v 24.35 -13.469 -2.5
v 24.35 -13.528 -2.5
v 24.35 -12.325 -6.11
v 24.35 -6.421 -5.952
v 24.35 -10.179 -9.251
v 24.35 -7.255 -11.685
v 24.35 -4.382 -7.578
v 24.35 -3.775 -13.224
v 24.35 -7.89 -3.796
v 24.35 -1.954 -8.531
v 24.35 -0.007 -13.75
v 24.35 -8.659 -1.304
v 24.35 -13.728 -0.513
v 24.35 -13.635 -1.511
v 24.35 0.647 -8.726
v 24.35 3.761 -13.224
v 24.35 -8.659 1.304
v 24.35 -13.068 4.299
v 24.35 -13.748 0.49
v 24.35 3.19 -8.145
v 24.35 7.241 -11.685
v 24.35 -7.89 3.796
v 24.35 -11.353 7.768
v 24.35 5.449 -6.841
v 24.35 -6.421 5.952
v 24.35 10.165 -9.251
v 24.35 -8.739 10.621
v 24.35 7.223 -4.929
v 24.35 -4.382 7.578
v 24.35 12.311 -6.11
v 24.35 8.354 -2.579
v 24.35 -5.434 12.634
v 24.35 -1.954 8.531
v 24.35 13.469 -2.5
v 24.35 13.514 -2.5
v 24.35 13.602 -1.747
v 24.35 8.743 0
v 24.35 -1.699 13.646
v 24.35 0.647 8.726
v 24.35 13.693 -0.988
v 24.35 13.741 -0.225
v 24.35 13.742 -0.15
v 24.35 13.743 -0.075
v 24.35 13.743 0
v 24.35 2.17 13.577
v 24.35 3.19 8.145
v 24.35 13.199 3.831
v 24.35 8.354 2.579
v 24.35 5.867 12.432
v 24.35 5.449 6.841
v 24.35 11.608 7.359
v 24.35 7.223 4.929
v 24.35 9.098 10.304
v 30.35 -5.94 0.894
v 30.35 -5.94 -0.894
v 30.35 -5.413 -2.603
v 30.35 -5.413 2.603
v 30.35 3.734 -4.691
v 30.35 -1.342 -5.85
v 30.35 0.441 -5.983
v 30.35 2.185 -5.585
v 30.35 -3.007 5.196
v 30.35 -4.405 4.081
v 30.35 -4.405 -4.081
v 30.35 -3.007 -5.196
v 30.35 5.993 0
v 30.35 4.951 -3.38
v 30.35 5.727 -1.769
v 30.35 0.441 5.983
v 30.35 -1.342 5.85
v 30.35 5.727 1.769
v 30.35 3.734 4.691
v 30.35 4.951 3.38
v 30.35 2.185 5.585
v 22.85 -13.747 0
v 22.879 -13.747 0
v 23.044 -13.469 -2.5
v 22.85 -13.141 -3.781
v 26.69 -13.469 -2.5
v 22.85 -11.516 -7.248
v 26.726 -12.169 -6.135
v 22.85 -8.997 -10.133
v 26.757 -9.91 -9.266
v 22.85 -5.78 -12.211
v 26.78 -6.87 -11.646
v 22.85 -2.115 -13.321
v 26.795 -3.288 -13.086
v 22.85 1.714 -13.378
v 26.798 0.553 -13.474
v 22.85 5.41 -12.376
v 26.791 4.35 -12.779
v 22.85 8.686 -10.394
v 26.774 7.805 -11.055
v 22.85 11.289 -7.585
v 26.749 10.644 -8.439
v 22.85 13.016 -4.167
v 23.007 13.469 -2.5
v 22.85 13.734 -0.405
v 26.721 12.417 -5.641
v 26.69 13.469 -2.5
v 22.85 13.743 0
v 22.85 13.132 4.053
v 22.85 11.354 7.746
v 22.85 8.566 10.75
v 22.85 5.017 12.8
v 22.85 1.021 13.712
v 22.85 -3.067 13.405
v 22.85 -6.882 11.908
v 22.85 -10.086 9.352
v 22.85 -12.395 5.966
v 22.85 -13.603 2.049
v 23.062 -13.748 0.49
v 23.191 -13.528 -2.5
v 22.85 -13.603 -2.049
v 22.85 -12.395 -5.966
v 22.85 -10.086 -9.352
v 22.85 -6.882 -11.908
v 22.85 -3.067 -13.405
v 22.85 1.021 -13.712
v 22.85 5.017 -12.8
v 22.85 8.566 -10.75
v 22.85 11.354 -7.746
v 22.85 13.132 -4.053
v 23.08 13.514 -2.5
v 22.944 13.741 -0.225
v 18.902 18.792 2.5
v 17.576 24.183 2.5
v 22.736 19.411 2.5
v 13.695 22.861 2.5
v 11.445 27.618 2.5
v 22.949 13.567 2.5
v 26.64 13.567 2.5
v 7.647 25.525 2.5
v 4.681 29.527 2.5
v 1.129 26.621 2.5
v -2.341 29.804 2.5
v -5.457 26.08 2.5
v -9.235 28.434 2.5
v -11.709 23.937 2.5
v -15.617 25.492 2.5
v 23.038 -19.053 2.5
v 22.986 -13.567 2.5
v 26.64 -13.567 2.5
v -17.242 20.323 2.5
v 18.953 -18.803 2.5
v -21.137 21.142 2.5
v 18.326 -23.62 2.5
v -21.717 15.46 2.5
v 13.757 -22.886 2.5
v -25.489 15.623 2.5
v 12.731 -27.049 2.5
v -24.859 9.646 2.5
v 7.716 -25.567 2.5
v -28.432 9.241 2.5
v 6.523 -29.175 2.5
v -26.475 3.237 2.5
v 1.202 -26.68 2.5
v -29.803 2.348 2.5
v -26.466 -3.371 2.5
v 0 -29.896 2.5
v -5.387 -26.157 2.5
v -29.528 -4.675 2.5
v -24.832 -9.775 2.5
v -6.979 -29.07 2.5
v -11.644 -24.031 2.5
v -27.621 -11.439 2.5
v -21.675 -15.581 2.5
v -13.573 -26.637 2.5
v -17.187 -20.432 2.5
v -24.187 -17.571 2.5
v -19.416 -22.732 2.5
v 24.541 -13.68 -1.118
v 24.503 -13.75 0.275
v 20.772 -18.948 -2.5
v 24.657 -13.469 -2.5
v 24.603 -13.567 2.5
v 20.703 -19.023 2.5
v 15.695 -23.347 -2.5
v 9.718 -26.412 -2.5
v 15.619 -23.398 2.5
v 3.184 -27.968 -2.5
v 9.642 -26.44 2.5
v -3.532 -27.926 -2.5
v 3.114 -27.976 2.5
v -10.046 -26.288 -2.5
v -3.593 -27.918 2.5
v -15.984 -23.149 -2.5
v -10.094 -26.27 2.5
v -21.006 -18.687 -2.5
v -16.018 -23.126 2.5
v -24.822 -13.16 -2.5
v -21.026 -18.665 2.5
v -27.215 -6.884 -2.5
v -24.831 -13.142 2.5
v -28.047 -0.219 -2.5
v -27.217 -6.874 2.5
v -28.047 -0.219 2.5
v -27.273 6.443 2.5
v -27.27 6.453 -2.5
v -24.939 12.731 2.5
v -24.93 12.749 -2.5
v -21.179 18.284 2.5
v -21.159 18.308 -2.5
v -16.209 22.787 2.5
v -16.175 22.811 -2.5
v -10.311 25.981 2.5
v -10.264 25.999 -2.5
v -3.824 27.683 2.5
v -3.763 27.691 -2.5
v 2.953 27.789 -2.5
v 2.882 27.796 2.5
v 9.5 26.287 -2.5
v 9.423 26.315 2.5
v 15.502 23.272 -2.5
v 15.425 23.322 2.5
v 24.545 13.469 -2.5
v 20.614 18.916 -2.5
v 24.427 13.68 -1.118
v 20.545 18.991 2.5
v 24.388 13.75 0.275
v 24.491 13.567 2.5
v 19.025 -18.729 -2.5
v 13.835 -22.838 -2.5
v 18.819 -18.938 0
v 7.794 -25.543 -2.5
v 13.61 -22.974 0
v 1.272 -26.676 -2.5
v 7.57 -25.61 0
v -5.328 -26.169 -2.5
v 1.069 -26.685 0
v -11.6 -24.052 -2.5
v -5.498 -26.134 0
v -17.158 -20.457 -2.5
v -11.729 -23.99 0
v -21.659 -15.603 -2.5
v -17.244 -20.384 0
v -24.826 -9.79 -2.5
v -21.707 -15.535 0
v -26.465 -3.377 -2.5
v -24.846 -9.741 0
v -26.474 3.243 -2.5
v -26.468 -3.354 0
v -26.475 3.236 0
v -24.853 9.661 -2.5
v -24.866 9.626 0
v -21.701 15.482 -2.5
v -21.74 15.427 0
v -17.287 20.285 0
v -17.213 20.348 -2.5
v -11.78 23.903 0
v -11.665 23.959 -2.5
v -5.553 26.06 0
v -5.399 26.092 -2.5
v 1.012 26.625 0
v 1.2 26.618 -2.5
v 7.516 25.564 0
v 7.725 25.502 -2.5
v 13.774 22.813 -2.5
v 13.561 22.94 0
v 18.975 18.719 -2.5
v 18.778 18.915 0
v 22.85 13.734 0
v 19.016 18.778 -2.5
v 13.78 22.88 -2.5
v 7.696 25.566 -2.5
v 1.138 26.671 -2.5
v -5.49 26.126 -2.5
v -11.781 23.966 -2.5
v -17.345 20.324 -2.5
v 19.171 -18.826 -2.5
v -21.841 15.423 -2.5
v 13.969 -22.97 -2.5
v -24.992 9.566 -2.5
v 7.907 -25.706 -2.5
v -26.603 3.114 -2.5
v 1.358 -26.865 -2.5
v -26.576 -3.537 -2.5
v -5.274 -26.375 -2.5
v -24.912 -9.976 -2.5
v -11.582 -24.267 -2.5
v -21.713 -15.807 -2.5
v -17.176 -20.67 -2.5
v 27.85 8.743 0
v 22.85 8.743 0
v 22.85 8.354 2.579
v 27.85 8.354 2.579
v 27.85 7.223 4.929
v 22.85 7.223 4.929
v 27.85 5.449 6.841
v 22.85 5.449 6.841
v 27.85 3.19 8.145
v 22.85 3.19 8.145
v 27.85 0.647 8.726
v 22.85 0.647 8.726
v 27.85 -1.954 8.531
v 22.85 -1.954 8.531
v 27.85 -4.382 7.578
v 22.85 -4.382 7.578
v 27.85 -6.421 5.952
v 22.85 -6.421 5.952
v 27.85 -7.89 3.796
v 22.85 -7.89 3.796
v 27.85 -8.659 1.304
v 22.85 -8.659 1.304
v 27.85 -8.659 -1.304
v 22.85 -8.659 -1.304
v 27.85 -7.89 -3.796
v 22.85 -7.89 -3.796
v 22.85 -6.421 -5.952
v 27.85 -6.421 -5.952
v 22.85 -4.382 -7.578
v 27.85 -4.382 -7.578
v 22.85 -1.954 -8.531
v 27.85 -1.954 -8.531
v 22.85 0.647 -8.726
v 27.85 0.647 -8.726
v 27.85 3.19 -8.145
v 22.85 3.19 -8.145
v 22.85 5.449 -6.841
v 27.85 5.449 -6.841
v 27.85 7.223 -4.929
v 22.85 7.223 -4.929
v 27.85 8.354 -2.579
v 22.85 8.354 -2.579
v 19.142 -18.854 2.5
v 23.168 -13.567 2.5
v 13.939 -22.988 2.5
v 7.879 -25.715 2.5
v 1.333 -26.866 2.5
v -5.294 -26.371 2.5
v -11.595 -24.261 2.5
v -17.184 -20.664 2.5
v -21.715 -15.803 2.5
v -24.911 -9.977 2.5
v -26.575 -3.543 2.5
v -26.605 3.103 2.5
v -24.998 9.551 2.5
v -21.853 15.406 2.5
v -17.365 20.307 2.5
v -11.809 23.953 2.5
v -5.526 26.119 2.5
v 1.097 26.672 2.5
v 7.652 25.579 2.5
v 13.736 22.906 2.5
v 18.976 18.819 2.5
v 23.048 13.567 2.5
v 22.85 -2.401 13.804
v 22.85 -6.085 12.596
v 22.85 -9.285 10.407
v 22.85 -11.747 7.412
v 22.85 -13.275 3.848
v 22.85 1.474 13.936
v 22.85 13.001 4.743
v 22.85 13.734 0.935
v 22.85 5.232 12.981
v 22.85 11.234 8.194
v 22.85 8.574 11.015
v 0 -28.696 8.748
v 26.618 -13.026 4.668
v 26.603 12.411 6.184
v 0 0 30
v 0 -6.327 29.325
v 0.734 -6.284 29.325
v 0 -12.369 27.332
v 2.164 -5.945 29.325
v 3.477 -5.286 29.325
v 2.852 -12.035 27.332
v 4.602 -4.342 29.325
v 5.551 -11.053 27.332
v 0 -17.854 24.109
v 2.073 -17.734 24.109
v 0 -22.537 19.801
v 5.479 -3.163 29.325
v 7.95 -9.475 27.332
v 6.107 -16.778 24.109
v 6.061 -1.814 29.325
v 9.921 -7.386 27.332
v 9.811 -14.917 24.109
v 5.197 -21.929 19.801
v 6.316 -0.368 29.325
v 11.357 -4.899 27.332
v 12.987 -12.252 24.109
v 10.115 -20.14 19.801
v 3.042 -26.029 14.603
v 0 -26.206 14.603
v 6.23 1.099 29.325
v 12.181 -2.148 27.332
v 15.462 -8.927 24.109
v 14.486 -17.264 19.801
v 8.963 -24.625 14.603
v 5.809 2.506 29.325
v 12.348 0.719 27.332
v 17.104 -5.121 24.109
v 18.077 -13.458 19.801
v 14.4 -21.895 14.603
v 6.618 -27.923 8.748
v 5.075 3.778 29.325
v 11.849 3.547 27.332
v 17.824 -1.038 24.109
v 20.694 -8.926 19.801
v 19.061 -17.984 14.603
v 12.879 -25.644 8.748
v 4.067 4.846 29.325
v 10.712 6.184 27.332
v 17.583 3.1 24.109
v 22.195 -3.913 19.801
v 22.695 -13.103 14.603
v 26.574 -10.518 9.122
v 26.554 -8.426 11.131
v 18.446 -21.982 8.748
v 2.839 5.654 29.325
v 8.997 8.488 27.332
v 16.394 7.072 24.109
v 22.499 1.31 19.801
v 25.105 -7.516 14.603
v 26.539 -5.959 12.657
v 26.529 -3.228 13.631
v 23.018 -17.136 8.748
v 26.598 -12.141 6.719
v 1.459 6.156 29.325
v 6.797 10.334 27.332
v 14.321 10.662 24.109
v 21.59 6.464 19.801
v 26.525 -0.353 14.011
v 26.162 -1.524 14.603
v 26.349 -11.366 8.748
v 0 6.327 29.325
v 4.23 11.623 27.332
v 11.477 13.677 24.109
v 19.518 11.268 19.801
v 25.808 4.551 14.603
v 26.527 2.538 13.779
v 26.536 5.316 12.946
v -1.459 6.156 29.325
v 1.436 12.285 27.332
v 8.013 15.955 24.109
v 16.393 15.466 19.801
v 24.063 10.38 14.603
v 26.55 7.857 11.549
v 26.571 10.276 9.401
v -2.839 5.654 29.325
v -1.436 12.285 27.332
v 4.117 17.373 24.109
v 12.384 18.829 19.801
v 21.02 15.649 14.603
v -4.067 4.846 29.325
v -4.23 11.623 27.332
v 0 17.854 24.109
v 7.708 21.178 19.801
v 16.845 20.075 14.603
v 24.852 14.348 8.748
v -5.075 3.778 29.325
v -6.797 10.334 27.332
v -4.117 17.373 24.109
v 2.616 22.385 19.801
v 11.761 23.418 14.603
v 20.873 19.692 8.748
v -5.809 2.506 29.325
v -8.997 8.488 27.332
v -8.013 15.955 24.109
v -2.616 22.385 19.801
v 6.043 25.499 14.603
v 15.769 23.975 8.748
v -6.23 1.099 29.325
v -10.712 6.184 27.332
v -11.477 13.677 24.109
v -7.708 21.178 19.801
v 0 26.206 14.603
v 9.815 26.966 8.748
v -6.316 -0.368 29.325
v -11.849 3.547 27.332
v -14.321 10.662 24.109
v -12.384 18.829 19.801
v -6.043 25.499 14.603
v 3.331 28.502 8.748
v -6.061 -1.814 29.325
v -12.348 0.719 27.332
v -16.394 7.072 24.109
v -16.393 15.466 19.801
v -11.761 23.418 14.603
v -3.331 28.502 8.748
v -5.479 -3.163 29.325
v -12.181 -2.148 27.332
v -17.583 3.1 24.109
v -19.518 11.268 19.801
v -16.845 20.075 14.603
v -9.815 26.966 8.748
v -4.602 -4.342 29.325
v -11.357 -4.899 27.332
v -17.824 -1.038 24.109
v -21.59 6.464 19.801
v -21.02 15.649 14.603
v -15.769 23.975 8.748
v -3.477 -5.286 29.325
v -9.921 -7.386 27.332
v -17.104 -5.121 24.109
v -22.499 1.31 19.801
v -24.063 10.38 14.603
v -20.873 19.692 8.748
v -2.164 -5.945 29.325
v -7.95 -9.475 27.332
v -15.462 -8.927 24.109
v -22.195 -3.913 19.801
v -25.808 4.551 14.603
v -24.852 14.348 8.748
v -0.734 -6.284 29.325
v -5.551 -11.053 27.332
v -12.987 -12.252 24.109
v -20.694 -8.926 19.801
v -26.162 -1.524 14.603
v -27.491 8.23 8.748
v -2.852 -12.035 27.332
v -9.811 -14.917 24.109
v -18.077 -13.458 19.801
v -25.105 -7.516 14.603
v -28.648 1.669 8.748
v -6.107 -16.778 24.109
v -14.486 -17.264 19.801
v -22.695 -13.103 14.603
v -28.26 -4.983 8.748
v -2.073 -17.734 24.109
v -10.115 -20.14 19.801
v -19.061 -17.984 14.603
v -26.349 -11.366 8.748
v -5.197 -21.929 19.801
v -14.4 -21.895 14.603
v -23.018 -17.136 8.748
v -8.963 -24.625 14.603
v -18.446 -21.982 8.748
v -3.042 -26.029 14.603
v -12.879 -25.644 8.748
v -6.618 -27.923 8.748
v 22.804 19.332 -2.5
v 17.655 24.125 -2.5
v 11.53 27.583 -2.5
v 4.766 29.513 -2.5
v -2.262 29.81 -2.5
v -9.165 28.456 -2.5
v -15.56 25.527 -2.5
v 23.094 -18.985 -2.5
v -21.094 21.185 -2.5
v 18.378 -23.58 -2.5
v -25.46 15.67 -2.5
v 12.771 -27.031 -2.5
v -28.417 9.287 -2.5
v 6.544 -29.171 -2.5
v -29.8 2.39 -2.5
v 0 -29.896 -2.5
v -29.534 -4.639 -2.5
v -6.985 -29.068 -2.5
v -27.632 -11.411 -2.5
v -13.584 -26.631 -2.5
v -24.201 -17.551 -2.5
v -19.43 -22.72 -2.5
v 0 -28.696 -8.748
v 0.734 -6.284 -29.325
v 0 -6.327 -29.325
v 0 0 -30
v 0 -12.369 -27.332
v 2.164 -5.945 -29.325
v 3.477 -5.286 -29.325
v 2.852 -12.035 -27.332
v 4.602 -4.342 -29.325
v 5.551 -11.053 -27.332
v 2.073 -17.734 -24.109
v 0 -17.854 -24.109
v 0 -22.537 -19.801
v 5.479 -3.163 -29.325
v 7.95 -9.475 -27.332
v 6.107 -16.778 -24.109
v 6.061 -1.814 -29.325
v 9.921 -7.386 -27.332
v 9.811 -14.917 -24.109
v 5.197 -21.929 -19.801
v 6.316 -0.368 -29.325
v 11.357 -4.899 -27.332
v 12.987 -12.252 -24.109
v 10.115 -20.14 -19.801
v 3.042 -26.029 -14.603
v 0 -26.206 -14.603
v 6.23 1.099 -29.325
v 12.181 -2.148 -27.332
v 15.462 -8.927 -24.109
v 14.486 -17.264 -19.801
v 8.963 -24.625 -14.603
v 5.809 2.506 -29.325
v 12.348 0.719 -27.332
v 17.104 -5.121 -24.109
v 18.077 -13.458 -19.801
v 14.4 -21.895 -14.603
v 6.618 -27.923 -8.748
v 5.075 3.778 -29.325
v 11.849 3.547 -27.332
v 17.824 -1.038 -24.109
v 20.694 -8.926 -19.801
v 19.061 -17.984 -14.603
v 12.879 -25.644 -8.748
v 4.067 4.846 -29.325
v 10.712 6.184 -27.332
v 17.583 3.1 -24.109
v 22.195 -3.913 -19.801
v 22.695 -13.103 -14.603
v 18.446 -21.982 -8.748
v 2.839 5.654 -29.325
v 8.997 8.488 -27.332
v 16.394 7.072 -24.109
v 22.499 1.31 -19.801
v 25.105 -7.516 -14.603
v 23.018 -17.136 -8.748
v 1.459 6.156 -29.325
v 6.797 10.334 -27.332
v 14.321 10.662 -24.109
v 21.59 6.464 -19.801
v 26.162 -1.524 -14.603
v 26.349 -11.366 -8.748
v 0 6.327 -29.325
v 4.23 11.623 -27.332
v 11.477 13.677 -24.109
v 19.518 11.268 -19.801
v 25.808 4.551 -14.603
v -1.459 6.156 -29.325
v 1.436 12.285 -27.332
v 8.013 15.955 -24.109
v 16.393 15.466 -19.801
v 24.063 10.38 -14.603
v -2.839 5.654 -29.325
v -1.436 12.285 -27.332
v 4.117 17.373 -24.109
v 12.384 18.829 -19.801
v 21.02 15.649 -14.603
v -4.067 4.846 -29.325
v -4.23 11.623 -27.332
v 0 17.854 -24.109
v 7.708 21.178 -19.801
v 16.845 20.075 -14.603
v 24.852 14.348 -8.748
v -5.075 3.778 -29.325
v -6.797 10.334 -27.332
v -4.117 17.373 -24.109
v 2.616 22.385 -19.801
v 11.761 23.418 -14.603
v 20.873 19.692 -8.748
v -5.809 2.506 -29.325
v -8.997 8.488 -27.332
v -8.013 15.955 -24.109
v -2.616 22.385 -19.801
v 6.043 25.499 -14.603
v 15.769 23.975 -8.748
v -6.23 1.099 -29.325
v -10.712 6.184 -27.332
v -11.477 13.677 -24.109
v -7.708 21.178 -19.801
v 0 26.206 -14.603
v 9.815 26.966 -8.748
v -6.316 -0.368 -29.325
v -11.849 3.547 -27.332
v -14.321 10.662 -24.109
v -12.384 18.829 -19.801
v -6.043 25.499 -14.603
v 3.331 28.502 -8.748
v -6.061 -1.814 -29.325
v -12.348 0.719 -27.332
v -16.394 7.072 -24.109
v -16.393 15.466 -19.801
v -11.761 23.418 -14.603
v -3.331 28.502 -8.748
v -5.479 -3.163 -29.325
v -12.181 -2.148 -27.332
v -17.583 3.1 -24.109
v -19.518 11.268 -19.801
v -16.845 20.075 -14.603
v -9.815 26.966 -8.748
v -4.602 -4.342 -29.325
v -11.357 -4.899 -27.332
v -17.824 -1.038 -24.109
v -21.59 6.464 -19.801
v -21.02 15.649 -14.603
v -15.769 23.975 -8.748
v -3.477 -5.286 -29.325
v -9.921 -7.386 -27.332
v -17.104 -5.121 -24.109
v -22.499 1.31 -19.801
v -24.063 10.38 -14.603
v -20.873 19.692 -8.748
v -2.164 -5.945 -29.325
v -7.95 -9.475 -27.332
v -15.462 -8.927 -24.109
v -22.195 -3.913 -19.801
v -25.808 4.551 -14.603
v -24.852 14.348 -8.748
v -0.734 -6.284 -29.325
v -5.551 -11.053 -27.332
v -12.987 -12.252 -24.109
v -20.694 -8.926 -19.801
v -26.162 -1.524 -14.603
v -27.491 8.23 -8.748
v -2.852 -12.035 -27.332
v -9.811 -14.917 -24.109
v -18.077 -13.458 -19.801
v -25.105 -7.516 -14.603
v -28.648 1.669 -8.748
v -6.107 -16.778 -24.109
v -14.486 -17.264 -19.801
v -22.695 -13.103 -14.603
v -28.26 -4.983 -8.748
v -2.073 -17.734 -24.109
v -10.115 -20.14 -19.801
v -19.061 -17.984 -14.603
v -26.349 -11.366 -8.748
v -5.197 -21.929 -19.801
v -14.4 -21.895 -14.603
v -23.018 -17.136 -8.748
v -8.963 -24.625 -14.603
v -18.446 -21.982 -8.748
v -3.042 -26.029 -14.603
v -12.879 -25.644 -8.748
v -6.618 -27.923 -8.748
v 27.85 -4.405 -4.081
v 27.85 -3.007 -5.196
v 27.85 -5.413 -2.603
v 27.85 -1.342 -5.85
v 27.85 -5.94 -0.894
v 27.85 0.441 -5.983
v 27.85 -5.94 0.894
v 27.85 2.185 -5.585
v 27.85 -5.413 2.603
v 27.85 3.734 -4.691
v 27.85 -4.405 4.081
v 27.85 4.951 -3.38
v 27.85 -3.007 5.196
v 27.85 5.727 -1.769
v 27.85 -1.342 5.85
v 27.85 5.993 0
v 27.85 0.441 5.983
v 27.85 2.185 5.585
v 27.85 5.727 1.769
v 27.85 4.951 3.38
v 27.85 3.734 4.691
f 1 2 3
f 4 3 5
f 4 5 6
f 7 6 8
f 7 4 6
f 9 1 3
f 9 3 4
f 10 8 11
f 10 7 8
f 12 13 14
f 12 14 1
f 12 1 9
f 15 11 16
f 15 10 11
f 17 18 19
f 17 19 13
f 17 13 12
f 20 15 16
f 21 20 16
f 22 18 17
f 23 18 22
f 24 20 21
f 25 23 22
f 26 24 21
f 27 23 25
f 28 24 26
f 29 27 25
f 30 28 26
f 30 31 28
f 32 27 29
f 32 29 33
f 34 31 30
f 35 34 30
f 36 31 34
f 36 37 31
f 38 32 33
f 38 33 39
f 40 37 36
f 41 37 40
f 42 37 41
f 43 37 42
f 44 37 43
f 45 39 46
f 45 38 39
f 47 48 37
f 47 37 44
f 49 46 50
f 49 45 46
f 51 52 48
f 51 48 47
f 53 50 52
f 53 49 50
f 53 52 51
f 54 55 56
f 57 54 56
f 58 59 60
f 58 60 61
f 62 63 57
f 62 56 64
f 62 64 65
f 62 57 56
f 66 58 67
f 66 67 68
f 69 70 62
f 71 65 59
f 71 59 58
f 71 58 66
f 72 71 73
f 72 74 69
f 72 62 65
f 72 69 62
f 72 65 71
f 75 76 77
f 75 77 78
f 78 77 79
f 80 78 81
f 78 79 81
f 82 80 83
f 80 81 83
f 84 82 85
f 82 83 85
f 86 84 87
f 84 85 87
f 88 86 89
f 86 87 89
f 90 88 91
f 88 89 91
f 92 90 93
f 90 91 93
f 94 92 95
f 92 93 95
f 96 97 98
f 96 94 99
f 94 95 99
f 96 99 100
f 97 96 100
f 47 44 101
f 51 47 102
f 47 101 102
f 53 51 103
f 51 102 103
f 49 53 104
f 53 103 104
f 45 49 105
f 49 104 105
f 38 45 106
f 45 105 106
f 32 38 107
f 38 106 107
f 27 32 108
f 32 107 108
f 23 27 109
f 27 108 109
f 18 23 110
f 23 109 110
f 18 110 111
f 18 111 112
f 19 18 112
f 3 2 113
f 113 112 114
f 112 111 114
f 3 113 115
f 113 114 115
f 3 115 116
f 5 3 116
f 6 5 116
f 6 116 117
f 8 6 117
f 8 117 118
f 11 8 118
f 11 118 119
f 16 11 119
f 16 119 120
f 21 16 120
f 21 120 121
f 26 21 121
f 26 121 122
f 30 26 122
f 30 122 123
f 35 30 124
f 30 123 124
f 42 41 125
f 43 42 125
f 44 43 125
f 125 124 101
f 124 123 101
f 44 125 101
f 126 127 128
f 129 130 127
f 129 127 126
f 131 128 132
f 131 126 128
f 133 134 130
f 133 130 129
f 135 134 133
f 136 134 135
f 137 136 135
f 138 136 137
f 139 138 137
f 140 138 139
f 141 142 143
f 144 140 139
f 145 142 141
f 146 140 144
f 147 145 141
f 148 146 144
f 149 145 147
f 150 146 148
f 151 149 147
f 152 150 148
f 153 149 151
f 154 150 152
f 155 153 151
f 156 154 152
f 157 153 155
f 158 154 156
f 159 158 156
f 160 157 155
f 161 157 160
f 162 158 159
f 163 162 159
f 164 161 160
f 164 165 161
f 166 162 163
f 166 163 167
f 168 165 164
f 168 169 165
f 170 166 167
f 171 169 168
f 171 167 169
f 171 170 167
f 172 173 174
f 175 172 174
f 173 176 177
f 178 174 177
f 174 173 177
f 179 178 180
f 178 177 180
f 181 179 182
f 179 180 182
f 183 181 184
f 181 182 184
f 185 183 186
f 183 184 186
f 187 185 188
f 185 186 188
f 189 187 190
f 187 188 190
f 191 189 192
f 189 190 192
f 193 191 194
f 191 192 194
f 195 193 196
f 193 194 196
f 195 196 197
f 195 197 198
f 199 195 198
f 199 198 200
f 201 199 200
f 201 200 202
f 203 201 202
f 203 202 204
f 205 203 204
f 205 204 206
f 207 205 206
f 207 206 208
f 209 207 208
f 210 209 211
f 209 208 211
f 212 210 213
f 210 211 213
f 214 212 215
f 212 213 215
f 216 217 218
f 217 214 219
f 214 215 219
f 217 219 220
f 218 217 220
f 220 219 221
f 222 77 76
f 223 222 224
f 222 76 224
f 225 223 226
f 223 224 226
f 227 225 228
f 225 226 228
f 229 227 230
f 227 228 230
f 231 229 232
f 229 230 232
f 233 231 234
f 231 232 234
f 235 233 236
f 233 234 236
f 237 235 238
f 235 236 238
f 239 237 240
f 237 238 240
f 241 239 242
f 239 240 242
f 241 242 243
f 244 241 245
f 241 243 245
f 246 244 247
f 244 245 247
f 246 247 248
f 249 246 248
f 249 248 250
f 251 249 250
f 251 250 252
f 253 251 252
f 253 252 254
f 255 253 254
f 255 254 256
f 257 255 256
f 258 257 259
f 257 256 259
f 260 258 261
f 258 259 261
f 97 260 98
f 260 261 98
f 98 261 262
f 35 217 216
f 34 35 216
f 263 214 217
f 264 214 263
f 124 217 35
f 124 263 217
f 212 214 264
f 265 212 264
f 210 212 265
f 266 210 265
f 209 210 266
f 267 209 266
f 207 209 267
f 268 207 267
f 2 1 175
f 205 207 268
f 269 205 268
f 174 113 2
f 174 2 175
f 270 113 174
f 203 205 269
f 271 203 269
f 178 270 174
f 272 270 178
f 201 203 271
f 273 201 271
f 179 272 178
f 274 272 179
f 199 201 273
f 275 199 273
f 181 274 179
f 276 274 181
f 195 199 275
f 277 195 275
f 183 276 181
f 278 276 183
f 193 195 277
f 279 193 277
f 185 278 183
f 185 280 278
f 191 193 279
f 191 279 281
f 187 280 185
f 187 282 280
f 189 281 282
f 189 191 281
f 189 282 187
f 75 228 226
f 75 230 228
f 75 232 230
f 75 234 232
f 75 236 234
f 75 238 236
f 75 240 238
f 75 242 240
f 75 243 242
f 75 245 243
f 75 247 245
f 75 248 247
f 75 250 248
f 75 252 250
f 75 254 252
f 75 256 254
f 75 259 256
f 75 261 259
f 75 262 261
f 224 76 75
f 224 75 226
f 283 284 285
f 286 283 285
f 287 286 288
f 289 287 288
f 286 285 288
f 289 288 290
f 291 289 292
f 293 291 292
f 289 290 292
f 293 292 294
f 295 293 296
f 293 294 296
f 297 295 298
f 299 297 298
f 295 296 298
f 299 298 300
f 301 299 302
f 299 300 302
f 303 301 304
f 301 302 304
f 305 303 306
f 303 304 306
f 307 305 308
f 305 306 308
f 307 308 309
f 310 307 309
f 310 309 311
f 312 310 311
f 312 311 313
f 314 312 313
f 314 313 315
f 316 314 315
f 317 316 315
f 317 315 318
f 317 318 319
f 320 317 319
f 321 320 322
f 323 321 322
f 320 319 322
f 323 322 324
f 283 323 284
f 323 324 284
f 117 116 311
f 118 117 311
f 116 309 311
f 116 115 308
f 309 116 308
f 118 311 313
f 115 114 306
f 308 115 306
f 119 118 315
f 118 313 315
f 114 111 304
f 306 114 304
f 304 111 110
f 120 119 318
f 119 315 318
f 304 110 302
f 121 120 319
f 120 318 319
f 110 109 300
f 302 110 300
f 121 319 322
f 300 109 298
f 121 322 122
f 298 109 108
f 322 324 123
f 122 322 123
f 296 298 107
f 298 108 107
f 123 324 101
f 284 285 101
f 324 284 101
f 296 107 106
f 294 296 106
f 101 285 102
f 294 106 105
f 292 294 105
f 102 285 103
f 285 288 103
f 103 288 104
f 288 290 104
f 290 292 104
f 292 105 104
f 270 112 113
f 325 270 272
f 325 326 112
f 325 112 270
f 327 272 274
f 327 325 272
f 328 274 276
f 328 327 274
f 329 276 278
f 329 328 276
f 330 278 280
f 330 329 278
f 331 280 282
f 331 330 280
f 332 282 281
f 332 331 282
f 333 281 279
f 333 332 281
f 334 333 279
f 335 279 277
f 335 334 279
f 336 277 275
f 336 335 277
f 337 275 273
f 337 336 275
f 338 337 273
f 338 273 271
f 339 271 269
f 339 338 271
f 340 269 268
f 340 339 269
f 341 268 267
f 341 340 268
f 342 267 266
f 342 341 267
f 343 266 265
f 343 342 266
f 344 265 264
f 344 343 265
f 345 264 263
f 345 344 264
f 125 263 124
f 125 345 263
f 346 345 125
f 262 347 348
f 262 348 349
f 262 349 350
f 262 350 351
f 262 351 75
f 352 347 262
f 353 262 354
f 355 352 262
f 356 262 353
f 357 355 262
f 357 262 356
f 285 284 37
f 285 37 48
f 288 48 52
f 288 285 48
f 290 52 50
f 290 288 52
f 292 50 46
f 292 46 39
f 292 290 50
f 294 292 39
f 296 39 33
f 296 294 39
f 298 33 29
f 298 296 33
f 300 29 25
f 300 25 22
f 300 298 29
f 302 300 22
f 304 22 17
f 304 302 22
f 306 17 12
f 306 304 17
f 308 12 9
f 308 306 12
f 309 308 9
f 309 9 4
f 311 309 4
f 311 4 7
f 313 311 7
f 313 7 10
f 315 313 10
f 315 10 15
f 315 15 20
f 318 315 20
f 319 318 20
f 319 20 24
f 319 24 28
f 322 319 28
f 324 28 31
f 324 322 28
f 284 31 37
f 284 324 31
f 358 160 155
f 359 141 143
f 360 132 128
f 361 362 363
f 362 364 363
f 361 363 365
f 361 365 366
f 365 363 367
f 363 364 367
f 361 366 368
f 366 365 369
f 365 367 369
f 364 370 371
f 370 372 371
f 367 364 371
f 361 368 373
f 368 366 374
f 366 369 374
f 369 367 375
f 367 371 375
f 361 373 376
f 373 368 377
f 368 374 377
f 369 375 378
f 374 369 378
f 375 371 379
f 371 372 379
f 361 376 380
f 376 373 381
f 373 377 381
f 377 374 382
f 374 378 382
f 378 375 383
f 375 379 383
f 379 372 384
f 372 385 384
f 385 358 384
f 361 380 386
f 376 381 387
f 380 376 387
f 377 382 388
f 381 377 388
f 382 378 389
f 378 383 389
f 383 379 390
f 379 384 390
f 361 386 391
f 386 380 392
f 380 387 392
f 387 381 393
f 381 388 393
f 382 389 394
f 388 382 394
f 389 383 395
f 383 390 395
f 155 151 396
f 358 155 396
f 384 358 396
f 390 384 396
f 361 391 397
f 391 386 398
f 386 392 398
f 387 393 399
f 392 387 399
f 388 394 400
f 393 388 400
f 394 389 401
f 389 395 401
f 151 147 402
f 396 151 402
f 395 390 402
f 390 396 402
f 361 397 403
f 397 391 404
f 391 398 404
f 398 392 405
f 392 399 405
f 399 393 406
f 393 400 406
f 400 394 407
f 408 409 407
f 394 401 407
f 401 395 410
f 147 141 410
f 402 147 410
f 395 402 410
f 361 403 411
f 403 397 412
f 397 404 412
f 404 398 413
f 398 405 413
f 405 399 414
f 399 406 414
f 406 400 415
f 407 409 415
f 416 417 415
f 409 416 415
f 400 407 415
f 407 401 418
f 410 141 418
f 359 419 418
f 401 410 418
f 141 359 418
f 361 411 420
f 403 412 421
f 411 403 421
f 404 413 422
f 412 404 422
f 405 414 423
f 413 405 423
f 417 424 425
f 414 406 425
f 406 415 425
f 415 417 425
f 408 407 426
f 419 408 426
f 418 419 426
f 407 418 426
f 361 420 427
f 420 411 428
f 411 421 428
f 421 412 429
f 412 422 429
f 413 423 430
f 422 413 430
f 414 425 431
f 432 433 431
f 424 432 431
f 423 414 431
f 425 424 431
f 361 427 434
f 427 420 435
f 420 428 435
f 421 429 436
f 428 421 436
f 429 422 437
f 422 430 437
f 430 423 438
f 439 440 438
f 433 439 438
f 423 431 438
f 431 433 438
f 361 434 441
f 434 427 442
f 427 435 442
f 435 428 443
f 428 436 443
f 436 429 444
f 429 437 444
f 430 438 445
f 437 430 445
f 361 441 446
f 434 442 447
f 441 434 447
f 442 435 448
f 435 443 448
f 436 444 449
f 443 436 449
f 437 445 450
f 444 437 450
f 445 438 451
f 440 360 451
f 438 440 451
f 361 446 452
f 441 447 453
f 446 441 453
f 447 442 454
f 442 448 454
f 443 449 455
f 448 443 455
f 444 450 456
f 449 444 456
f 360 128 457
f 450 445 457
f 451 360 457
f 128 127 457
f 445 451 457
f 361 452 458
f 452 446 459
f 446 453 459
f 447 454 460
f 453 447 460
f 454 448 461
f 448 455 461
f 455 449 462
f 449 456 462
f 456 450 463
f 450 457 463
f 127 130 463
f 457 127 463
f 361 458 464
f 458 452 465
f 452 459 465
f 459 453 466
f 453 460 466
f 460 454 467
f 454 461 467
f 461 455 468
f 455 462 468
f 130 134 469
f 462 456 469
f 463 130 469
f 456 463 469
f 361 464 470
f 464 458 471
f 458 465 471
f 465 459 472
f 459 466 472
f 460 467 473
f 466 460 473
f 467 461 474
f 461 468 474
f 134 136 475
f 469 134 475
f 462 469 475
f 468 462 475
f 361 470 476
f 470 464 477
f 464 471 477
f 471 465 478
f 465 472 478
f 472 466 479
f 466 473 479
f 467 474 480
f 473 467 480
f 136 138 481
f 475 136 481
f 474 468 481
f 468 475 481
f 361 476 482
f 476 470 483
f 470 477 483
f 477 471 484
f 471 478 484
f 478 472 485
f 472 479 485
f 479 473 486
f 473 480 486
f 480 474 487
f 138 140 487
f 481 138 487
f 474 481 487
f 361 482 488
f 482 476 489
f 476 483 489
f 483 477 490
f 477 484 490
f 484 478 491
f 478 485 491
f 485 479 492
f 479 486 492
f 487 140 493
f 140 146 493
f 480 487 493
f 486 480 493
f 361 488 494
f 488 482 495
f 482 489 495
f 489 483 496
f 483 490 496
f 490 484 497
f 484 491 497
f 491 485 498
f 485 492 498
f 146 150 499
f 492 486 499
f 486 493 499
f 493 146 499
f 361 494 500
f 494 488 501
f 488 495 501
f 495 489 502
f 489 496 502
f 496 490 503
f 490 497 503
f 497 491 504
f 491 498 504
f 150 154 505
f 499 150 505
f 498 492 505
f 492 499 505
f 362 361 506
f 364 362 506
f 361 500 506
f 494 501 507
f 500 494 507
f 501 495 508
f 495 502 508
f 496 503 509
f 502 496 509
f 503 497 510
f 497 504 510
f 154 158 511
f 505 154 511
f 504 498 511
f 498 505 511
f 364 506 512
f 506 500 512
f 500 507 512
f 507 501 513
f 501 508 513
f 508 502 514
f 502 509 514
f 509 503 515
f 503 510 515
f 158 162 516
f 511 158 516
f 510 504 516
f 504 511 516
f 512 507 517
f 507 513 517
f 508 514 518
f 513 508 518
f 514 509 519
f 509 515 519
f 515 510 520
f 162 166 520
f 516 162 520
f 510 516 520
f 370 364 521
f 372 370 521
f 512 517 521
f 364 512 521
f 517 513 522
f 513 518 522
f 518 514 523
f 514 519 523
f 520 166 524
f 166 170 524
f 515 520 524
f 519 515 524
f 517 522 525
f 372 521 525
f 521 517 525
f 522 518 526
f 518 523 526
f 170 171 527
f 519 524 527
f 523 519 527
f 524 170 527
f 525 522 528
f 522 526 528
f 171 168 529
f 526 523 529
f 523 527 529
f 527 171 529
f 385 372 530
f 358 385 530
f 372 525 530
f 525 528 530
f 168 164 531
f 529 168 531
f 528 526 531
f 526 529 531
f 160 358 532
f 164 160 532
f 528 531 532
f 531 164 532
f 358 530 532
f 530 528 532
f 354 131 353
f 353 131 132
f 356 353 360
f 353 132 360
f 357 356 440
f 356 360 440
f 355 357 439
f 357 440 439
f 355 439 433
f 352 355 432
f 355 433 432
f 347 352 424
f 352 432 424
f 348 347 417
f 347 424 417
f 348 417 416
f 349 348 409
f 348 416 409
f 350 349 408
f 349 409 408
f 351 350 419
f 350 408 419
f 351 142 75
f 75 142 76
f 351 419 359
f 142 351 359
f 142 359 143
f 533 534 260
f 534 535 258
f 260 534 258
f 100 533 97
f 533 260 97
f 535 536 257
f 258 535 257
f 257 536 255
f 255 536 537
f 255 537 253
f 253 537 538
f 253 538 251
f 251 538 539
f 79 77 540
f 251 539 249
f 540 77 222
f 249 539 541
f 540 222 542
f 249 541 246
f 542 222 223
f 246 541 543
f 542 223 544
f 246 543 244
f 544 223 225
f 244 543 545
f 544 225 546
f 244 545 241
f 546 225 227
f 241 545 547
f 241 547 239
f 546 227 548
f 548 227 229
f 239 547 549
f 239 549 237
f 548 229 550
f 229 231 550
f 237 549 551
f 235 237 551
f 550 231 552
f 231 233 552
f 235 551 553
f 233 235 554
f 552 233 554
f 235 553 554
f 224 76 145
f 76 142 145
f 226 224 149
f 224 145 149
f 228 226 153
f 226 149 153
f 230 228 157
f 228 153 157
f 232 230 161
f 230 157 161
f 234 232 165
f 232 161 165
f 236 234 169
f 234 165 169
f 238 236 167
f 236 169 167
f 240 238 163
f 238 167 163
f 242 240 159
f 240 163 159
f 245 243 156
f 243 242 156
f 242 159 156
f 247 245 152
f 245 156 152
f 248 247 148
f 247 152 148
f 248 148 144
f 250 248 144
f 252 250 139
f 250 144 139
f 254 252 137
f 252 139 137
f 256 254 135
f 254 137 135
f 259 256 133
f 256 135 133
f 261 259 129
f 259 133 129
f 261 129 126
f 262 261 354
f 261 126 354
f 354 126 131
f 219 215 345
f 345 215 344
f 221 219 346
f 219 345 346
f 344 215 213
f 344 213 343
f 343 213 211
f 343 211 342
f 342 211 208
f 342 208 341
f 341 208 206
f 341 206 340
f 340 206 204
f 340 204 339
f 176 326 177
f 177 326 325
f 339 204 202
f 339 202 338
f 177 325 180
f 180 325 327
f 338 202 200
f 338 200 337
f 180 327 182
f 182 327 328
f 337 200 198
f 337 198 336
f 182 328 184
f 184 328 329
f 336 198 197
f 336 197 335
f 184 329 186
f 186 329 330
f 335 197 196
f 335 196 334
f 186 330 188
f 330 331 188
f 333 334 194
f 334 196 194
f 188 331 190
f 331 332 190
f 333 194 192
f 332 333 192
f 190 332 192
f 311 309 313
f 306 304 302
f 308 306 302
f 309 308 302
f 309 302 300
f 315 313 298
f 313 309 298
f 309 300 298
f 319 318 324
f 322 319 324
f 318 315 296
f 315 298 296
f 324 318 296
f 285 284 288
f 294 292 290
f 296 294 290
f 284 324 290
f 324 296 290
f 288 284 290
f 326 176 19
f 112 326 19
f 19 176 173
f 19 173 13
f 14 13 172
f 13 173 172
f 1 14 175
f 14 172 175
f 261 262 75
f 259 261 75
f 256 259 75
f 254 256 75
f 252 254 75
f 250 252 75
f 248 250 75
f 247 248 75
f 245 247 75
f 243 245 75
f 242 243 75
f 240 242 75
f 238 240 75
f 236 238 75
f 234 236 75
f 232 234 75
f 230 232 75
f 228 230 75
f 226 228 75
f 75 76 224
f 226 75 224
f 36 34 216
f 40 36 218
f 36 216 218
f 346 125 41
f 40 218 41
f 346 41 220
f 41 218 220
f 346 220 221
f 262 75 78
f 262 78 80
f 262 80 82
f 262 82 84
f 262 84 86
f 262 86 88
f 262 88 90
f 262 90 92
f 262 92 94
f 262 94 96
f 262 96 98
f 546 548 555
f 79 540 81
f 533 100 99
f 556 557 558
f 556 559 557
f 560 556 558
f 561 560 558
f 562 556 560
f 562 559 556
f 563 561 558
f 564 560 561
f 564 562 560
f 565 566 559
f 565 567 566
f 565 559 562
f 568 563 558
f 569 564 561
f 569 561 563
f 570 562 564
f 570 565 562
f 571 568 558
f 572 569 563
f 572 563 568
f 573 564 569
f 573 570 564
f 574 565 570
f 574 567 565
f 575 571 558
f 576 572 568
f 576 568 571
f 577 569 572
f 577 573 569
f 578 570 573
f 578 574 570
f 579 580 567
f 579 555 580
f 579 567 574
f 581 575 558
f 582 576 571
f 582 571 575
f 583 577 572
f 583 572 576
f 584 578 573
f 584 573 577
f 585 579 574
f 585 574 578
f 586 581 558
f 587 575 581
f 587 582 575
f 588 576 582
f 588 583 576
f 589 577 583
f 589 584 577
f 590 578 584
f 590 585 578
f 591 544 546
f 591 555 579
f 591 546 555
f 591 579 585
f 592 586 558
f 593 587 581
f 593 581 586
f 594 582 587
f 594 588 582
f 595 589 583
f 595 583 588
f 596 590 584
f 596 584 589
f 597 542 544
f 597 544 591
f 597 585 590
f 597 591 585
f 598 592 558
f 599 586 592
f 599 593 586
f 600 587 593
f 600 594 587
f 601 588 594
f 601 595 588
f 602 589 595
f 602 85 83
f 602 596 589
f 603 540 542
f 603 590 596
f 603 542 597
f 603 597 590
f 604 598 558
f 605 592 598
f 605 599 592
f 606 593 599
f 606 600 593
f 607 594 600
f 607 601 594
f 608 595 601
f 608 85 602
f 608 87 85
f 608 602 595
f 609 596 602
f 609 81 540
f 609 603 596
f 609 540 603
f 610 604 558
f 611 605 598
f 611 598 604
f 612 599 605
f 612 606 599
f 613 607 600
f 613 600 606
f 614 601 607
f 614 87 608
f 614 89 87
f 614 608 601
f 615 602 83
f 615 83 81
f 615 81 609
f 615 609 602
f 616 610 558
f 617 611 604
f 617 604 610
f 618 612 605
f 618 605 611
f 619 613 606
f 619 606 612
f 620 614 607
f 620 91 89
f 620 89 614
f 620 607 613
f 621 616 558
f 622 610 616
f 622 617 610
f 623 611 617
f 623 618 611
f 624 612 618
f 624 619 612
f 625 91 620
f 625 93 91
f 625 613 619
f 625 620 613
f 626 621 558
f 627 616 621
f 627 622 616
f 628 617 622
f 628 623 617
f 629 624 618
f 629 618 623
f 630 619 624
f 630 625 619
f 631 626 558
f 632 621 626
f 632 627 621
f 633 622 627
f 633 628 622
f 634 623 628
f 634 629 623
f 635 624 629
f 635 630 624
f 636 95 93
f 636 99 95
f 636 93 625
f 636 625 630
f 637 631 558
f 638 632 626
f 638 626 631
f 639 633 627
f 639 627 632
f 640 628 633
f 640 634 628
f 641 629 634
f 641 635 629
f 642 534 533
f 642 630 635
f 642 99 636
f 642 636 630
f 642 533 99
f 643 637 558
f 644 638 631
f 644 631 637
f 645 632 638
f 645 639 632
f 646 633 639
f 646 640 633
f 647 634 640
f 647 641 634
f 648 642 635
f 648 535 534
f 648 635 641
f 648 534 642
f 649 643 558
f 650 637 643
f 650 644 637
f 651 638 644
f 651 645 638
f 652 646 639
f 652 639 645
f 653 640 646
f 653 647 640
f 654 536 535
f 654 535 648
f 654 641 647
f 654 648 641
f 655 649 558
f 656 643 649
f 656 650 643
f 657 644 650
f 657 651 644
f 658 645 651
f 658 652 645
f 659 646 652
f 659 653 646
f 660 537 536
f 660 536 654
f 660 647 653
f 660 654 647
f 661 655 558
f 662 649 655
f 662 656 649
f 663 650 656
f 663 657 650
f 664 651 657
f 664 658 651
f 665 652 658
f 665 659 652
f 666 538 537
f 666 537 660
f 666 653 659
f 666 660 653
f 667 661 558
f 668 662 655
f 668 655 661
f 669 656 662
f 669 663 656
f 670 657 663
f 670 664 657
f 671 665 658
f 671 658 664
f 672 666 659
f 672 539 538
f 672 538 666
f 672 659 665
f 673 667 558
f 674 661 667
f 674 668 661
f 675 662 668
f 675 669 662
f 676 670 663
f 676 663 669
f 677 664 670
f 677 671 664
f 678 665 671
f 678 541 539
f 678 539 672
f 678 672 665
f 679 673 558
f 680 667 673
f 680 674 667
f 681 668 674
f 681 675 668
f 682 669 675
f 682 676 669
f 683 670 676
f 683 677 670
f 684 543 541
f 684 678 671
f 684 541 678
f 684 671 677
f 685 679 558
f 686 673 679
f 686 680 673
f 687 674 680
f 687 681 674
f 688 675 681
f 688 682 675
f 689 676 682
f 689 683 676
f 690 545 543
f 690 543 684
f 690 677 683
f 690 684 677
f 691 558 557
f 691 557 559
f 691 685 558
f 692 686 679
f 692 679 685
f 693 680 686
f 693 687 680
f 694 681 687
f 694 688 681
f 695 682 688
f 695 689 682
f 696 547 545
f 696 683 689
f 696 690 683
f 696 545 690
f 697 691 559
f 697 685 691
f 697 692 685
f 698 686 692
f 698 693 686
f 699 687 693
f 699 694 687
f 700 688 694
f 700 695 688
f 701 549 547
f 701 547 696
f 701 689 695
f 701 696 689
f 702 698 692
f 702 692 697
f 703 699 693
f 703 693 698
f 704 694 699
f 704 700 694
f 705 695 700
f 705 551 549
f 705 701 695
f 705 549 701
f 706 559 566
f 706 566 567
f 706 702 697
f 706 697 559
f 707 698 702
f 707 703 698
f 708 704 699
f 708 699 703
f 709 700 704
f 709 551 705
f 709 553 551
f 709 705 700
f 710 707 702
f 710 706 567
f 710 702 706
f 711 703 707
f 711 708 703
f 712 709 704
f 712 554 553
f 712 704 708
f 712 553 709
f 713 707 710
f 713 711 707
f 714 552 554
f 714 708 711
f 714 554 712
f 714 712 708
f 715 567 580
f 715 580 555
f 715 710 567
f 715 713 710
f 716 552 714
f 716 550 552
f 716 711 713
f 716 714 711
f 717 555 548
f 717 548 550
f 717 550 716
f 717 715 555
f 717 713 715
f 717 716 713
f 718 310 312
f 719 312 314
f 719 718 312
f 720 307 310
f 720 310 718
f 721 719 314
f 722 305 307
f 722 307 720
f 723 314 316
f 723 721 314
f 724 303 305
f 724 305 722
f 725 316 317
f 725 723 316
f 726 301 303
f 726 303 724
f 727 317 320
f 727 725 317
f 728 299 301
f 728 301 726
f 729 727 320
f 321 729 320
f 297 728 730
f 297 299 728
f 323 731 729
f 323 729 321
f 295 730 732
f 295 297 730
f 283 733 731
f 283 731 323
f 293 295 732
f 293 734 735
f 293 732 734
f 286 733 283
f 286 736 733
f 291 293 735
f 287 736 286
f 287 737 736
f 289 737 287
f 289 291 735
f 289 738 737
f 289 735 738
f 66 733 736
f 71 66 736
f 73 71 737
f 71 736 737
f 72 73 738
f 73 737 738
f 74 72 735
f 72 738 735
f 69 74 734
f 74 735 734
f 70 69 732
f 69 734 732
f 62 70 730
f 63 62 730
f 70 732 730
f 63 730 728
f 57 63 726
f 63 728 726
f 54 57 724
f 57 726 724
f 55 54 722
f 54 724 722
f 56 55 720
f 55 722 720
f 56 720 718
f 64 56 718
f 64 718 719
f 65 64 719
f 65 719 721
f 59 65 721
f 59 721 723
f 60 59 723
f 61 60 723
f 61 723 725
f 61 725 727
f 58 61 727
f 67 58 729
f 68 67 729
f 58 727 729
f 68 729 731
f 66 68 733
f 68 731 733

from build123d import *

# Parameters (mm, degrees)
F3_W      = 7.5
F3_H      = 5
F5_W      = 1.25
F5_H      = 5
F8_R      = 13.75
F9_DEPTH  = 7.15
F10_R     = 13.75
F10_R_2   = 8.75
F11_DEPTH = 1.5
F12_R     = 8.75
F13_DEPTH = 5
F14_R     = 6
F15_DEPTH = 2.5


with BuildPart() as f1:
    # F0 (on Right) → F1 (revolve)
    with BuildSketch(Plane.YZ):
        with BuildLine():
            Line((-9.245e-07, 0), (-9.245e-07, 30))
            ThreePointArc((-9.245e-07, 30), (-21.2132043601, 21.2132034356), (-30.0000009245, 0))
            Line((-30.0000009245, 0), (-9.245e-07, 0))
        make_face()
    revolve(axis=Axis((0, -9.245e-07, 15), (0, 0, 1)))


with BuildPart() as f2_1:
    # F2: instance of F1
    add(f1.part.mirror(Plane.XY))


with BuildPart() as f4_tool:
    # F3 (on Right) → F4 (revolve)
    with BuildSketch(Plane.YZ):
        with Locations((-30.4568037391, 0)):
            Rectangle(F3_W, F3_H)
    revolve(axis=Axis((0, -0.0311268886, -0.3012642264), (0, 0, -1)))


with BuildPart() as f1_1:
    add(f1.part)

    # F4: cut by f4_tool
    add(f4_tool.part, mode=Mode.SUBTRACT)


with BuildPart() as f2_1_1:
    add(f2_1.part)

    # F4: cut by f4_tool
    add(f4_tool.part, mode=Mode.SUBTRACT)


with BuildPart() as f6:
    # F5 (on Right) → F6 (revolve)
    with BuildSketch(Plane.YZ):
        with Locations((-27.5242437874, 0)):
            Rectangle(F5_W, F5_H)
    revolve(axis=Axis((0, -0.1021973221, 0.176653266), (0, 0, -1)))


with BuildPart() as f9_tool:
    # F8 (on offset) → F9 (new body)
    with BuildSketch(Plane.YZ.offset(30)):
        with Locations((-2.4813e-06, 0.2651515242)):
            Circle(F8_R)
    extrude(amount=-F9_DEPTH)


with BuildPart() as f1_2:
    add(f1_1.part)

    # F9: cut by f9_tool
    add(f9_tool.part, mode=Mode.SUBTRACT)


with BuildPart() as f2_1_2:
    add(f2_1_1.part)

    # F9: cut by f9_tool
    add(f9_tool.part, mode=Mode.SUBTRACT)


with BuildPart() as f6_1:
    add(f6.part)

    # F9: cut by f9_tool
    add(f9_tool.part, mode=Mode.SUBTRACT)

    # F10 (on face) → F11 (join)
    with BuildSketch(Plane.YZ.offset(22.85)):
        with Locations((-0.0068950708, 0)):
            Circle(F10_R)
        with Locations((-0.0068950708, 0)):
            Circle(F10_R_2, mode=Mode.SUBTRACT)
    extrude(amount=F11_DEPTH)


with BuildPart() as f13:
    # F12 (on face) → F13 (new body)
    with BuildSketch(Plane.YZ.offset(22.85)):
        with Locations((-0.0068950708, 0)):
            Circle(F12_R)
    extrude(amount=F13_DEPTH)

    # F14 (on face) → F15 (join)
    with BuildSketch(Plane.YZ.offset(27.85)):
        with Locations((-0.0068950708, 0)):
            Circle(F14_R)
    extrude(amount=F15_DEPTH)


solid = Compound([f1_2.part, f2_1_2.part, f6_1.part, f13.part])
